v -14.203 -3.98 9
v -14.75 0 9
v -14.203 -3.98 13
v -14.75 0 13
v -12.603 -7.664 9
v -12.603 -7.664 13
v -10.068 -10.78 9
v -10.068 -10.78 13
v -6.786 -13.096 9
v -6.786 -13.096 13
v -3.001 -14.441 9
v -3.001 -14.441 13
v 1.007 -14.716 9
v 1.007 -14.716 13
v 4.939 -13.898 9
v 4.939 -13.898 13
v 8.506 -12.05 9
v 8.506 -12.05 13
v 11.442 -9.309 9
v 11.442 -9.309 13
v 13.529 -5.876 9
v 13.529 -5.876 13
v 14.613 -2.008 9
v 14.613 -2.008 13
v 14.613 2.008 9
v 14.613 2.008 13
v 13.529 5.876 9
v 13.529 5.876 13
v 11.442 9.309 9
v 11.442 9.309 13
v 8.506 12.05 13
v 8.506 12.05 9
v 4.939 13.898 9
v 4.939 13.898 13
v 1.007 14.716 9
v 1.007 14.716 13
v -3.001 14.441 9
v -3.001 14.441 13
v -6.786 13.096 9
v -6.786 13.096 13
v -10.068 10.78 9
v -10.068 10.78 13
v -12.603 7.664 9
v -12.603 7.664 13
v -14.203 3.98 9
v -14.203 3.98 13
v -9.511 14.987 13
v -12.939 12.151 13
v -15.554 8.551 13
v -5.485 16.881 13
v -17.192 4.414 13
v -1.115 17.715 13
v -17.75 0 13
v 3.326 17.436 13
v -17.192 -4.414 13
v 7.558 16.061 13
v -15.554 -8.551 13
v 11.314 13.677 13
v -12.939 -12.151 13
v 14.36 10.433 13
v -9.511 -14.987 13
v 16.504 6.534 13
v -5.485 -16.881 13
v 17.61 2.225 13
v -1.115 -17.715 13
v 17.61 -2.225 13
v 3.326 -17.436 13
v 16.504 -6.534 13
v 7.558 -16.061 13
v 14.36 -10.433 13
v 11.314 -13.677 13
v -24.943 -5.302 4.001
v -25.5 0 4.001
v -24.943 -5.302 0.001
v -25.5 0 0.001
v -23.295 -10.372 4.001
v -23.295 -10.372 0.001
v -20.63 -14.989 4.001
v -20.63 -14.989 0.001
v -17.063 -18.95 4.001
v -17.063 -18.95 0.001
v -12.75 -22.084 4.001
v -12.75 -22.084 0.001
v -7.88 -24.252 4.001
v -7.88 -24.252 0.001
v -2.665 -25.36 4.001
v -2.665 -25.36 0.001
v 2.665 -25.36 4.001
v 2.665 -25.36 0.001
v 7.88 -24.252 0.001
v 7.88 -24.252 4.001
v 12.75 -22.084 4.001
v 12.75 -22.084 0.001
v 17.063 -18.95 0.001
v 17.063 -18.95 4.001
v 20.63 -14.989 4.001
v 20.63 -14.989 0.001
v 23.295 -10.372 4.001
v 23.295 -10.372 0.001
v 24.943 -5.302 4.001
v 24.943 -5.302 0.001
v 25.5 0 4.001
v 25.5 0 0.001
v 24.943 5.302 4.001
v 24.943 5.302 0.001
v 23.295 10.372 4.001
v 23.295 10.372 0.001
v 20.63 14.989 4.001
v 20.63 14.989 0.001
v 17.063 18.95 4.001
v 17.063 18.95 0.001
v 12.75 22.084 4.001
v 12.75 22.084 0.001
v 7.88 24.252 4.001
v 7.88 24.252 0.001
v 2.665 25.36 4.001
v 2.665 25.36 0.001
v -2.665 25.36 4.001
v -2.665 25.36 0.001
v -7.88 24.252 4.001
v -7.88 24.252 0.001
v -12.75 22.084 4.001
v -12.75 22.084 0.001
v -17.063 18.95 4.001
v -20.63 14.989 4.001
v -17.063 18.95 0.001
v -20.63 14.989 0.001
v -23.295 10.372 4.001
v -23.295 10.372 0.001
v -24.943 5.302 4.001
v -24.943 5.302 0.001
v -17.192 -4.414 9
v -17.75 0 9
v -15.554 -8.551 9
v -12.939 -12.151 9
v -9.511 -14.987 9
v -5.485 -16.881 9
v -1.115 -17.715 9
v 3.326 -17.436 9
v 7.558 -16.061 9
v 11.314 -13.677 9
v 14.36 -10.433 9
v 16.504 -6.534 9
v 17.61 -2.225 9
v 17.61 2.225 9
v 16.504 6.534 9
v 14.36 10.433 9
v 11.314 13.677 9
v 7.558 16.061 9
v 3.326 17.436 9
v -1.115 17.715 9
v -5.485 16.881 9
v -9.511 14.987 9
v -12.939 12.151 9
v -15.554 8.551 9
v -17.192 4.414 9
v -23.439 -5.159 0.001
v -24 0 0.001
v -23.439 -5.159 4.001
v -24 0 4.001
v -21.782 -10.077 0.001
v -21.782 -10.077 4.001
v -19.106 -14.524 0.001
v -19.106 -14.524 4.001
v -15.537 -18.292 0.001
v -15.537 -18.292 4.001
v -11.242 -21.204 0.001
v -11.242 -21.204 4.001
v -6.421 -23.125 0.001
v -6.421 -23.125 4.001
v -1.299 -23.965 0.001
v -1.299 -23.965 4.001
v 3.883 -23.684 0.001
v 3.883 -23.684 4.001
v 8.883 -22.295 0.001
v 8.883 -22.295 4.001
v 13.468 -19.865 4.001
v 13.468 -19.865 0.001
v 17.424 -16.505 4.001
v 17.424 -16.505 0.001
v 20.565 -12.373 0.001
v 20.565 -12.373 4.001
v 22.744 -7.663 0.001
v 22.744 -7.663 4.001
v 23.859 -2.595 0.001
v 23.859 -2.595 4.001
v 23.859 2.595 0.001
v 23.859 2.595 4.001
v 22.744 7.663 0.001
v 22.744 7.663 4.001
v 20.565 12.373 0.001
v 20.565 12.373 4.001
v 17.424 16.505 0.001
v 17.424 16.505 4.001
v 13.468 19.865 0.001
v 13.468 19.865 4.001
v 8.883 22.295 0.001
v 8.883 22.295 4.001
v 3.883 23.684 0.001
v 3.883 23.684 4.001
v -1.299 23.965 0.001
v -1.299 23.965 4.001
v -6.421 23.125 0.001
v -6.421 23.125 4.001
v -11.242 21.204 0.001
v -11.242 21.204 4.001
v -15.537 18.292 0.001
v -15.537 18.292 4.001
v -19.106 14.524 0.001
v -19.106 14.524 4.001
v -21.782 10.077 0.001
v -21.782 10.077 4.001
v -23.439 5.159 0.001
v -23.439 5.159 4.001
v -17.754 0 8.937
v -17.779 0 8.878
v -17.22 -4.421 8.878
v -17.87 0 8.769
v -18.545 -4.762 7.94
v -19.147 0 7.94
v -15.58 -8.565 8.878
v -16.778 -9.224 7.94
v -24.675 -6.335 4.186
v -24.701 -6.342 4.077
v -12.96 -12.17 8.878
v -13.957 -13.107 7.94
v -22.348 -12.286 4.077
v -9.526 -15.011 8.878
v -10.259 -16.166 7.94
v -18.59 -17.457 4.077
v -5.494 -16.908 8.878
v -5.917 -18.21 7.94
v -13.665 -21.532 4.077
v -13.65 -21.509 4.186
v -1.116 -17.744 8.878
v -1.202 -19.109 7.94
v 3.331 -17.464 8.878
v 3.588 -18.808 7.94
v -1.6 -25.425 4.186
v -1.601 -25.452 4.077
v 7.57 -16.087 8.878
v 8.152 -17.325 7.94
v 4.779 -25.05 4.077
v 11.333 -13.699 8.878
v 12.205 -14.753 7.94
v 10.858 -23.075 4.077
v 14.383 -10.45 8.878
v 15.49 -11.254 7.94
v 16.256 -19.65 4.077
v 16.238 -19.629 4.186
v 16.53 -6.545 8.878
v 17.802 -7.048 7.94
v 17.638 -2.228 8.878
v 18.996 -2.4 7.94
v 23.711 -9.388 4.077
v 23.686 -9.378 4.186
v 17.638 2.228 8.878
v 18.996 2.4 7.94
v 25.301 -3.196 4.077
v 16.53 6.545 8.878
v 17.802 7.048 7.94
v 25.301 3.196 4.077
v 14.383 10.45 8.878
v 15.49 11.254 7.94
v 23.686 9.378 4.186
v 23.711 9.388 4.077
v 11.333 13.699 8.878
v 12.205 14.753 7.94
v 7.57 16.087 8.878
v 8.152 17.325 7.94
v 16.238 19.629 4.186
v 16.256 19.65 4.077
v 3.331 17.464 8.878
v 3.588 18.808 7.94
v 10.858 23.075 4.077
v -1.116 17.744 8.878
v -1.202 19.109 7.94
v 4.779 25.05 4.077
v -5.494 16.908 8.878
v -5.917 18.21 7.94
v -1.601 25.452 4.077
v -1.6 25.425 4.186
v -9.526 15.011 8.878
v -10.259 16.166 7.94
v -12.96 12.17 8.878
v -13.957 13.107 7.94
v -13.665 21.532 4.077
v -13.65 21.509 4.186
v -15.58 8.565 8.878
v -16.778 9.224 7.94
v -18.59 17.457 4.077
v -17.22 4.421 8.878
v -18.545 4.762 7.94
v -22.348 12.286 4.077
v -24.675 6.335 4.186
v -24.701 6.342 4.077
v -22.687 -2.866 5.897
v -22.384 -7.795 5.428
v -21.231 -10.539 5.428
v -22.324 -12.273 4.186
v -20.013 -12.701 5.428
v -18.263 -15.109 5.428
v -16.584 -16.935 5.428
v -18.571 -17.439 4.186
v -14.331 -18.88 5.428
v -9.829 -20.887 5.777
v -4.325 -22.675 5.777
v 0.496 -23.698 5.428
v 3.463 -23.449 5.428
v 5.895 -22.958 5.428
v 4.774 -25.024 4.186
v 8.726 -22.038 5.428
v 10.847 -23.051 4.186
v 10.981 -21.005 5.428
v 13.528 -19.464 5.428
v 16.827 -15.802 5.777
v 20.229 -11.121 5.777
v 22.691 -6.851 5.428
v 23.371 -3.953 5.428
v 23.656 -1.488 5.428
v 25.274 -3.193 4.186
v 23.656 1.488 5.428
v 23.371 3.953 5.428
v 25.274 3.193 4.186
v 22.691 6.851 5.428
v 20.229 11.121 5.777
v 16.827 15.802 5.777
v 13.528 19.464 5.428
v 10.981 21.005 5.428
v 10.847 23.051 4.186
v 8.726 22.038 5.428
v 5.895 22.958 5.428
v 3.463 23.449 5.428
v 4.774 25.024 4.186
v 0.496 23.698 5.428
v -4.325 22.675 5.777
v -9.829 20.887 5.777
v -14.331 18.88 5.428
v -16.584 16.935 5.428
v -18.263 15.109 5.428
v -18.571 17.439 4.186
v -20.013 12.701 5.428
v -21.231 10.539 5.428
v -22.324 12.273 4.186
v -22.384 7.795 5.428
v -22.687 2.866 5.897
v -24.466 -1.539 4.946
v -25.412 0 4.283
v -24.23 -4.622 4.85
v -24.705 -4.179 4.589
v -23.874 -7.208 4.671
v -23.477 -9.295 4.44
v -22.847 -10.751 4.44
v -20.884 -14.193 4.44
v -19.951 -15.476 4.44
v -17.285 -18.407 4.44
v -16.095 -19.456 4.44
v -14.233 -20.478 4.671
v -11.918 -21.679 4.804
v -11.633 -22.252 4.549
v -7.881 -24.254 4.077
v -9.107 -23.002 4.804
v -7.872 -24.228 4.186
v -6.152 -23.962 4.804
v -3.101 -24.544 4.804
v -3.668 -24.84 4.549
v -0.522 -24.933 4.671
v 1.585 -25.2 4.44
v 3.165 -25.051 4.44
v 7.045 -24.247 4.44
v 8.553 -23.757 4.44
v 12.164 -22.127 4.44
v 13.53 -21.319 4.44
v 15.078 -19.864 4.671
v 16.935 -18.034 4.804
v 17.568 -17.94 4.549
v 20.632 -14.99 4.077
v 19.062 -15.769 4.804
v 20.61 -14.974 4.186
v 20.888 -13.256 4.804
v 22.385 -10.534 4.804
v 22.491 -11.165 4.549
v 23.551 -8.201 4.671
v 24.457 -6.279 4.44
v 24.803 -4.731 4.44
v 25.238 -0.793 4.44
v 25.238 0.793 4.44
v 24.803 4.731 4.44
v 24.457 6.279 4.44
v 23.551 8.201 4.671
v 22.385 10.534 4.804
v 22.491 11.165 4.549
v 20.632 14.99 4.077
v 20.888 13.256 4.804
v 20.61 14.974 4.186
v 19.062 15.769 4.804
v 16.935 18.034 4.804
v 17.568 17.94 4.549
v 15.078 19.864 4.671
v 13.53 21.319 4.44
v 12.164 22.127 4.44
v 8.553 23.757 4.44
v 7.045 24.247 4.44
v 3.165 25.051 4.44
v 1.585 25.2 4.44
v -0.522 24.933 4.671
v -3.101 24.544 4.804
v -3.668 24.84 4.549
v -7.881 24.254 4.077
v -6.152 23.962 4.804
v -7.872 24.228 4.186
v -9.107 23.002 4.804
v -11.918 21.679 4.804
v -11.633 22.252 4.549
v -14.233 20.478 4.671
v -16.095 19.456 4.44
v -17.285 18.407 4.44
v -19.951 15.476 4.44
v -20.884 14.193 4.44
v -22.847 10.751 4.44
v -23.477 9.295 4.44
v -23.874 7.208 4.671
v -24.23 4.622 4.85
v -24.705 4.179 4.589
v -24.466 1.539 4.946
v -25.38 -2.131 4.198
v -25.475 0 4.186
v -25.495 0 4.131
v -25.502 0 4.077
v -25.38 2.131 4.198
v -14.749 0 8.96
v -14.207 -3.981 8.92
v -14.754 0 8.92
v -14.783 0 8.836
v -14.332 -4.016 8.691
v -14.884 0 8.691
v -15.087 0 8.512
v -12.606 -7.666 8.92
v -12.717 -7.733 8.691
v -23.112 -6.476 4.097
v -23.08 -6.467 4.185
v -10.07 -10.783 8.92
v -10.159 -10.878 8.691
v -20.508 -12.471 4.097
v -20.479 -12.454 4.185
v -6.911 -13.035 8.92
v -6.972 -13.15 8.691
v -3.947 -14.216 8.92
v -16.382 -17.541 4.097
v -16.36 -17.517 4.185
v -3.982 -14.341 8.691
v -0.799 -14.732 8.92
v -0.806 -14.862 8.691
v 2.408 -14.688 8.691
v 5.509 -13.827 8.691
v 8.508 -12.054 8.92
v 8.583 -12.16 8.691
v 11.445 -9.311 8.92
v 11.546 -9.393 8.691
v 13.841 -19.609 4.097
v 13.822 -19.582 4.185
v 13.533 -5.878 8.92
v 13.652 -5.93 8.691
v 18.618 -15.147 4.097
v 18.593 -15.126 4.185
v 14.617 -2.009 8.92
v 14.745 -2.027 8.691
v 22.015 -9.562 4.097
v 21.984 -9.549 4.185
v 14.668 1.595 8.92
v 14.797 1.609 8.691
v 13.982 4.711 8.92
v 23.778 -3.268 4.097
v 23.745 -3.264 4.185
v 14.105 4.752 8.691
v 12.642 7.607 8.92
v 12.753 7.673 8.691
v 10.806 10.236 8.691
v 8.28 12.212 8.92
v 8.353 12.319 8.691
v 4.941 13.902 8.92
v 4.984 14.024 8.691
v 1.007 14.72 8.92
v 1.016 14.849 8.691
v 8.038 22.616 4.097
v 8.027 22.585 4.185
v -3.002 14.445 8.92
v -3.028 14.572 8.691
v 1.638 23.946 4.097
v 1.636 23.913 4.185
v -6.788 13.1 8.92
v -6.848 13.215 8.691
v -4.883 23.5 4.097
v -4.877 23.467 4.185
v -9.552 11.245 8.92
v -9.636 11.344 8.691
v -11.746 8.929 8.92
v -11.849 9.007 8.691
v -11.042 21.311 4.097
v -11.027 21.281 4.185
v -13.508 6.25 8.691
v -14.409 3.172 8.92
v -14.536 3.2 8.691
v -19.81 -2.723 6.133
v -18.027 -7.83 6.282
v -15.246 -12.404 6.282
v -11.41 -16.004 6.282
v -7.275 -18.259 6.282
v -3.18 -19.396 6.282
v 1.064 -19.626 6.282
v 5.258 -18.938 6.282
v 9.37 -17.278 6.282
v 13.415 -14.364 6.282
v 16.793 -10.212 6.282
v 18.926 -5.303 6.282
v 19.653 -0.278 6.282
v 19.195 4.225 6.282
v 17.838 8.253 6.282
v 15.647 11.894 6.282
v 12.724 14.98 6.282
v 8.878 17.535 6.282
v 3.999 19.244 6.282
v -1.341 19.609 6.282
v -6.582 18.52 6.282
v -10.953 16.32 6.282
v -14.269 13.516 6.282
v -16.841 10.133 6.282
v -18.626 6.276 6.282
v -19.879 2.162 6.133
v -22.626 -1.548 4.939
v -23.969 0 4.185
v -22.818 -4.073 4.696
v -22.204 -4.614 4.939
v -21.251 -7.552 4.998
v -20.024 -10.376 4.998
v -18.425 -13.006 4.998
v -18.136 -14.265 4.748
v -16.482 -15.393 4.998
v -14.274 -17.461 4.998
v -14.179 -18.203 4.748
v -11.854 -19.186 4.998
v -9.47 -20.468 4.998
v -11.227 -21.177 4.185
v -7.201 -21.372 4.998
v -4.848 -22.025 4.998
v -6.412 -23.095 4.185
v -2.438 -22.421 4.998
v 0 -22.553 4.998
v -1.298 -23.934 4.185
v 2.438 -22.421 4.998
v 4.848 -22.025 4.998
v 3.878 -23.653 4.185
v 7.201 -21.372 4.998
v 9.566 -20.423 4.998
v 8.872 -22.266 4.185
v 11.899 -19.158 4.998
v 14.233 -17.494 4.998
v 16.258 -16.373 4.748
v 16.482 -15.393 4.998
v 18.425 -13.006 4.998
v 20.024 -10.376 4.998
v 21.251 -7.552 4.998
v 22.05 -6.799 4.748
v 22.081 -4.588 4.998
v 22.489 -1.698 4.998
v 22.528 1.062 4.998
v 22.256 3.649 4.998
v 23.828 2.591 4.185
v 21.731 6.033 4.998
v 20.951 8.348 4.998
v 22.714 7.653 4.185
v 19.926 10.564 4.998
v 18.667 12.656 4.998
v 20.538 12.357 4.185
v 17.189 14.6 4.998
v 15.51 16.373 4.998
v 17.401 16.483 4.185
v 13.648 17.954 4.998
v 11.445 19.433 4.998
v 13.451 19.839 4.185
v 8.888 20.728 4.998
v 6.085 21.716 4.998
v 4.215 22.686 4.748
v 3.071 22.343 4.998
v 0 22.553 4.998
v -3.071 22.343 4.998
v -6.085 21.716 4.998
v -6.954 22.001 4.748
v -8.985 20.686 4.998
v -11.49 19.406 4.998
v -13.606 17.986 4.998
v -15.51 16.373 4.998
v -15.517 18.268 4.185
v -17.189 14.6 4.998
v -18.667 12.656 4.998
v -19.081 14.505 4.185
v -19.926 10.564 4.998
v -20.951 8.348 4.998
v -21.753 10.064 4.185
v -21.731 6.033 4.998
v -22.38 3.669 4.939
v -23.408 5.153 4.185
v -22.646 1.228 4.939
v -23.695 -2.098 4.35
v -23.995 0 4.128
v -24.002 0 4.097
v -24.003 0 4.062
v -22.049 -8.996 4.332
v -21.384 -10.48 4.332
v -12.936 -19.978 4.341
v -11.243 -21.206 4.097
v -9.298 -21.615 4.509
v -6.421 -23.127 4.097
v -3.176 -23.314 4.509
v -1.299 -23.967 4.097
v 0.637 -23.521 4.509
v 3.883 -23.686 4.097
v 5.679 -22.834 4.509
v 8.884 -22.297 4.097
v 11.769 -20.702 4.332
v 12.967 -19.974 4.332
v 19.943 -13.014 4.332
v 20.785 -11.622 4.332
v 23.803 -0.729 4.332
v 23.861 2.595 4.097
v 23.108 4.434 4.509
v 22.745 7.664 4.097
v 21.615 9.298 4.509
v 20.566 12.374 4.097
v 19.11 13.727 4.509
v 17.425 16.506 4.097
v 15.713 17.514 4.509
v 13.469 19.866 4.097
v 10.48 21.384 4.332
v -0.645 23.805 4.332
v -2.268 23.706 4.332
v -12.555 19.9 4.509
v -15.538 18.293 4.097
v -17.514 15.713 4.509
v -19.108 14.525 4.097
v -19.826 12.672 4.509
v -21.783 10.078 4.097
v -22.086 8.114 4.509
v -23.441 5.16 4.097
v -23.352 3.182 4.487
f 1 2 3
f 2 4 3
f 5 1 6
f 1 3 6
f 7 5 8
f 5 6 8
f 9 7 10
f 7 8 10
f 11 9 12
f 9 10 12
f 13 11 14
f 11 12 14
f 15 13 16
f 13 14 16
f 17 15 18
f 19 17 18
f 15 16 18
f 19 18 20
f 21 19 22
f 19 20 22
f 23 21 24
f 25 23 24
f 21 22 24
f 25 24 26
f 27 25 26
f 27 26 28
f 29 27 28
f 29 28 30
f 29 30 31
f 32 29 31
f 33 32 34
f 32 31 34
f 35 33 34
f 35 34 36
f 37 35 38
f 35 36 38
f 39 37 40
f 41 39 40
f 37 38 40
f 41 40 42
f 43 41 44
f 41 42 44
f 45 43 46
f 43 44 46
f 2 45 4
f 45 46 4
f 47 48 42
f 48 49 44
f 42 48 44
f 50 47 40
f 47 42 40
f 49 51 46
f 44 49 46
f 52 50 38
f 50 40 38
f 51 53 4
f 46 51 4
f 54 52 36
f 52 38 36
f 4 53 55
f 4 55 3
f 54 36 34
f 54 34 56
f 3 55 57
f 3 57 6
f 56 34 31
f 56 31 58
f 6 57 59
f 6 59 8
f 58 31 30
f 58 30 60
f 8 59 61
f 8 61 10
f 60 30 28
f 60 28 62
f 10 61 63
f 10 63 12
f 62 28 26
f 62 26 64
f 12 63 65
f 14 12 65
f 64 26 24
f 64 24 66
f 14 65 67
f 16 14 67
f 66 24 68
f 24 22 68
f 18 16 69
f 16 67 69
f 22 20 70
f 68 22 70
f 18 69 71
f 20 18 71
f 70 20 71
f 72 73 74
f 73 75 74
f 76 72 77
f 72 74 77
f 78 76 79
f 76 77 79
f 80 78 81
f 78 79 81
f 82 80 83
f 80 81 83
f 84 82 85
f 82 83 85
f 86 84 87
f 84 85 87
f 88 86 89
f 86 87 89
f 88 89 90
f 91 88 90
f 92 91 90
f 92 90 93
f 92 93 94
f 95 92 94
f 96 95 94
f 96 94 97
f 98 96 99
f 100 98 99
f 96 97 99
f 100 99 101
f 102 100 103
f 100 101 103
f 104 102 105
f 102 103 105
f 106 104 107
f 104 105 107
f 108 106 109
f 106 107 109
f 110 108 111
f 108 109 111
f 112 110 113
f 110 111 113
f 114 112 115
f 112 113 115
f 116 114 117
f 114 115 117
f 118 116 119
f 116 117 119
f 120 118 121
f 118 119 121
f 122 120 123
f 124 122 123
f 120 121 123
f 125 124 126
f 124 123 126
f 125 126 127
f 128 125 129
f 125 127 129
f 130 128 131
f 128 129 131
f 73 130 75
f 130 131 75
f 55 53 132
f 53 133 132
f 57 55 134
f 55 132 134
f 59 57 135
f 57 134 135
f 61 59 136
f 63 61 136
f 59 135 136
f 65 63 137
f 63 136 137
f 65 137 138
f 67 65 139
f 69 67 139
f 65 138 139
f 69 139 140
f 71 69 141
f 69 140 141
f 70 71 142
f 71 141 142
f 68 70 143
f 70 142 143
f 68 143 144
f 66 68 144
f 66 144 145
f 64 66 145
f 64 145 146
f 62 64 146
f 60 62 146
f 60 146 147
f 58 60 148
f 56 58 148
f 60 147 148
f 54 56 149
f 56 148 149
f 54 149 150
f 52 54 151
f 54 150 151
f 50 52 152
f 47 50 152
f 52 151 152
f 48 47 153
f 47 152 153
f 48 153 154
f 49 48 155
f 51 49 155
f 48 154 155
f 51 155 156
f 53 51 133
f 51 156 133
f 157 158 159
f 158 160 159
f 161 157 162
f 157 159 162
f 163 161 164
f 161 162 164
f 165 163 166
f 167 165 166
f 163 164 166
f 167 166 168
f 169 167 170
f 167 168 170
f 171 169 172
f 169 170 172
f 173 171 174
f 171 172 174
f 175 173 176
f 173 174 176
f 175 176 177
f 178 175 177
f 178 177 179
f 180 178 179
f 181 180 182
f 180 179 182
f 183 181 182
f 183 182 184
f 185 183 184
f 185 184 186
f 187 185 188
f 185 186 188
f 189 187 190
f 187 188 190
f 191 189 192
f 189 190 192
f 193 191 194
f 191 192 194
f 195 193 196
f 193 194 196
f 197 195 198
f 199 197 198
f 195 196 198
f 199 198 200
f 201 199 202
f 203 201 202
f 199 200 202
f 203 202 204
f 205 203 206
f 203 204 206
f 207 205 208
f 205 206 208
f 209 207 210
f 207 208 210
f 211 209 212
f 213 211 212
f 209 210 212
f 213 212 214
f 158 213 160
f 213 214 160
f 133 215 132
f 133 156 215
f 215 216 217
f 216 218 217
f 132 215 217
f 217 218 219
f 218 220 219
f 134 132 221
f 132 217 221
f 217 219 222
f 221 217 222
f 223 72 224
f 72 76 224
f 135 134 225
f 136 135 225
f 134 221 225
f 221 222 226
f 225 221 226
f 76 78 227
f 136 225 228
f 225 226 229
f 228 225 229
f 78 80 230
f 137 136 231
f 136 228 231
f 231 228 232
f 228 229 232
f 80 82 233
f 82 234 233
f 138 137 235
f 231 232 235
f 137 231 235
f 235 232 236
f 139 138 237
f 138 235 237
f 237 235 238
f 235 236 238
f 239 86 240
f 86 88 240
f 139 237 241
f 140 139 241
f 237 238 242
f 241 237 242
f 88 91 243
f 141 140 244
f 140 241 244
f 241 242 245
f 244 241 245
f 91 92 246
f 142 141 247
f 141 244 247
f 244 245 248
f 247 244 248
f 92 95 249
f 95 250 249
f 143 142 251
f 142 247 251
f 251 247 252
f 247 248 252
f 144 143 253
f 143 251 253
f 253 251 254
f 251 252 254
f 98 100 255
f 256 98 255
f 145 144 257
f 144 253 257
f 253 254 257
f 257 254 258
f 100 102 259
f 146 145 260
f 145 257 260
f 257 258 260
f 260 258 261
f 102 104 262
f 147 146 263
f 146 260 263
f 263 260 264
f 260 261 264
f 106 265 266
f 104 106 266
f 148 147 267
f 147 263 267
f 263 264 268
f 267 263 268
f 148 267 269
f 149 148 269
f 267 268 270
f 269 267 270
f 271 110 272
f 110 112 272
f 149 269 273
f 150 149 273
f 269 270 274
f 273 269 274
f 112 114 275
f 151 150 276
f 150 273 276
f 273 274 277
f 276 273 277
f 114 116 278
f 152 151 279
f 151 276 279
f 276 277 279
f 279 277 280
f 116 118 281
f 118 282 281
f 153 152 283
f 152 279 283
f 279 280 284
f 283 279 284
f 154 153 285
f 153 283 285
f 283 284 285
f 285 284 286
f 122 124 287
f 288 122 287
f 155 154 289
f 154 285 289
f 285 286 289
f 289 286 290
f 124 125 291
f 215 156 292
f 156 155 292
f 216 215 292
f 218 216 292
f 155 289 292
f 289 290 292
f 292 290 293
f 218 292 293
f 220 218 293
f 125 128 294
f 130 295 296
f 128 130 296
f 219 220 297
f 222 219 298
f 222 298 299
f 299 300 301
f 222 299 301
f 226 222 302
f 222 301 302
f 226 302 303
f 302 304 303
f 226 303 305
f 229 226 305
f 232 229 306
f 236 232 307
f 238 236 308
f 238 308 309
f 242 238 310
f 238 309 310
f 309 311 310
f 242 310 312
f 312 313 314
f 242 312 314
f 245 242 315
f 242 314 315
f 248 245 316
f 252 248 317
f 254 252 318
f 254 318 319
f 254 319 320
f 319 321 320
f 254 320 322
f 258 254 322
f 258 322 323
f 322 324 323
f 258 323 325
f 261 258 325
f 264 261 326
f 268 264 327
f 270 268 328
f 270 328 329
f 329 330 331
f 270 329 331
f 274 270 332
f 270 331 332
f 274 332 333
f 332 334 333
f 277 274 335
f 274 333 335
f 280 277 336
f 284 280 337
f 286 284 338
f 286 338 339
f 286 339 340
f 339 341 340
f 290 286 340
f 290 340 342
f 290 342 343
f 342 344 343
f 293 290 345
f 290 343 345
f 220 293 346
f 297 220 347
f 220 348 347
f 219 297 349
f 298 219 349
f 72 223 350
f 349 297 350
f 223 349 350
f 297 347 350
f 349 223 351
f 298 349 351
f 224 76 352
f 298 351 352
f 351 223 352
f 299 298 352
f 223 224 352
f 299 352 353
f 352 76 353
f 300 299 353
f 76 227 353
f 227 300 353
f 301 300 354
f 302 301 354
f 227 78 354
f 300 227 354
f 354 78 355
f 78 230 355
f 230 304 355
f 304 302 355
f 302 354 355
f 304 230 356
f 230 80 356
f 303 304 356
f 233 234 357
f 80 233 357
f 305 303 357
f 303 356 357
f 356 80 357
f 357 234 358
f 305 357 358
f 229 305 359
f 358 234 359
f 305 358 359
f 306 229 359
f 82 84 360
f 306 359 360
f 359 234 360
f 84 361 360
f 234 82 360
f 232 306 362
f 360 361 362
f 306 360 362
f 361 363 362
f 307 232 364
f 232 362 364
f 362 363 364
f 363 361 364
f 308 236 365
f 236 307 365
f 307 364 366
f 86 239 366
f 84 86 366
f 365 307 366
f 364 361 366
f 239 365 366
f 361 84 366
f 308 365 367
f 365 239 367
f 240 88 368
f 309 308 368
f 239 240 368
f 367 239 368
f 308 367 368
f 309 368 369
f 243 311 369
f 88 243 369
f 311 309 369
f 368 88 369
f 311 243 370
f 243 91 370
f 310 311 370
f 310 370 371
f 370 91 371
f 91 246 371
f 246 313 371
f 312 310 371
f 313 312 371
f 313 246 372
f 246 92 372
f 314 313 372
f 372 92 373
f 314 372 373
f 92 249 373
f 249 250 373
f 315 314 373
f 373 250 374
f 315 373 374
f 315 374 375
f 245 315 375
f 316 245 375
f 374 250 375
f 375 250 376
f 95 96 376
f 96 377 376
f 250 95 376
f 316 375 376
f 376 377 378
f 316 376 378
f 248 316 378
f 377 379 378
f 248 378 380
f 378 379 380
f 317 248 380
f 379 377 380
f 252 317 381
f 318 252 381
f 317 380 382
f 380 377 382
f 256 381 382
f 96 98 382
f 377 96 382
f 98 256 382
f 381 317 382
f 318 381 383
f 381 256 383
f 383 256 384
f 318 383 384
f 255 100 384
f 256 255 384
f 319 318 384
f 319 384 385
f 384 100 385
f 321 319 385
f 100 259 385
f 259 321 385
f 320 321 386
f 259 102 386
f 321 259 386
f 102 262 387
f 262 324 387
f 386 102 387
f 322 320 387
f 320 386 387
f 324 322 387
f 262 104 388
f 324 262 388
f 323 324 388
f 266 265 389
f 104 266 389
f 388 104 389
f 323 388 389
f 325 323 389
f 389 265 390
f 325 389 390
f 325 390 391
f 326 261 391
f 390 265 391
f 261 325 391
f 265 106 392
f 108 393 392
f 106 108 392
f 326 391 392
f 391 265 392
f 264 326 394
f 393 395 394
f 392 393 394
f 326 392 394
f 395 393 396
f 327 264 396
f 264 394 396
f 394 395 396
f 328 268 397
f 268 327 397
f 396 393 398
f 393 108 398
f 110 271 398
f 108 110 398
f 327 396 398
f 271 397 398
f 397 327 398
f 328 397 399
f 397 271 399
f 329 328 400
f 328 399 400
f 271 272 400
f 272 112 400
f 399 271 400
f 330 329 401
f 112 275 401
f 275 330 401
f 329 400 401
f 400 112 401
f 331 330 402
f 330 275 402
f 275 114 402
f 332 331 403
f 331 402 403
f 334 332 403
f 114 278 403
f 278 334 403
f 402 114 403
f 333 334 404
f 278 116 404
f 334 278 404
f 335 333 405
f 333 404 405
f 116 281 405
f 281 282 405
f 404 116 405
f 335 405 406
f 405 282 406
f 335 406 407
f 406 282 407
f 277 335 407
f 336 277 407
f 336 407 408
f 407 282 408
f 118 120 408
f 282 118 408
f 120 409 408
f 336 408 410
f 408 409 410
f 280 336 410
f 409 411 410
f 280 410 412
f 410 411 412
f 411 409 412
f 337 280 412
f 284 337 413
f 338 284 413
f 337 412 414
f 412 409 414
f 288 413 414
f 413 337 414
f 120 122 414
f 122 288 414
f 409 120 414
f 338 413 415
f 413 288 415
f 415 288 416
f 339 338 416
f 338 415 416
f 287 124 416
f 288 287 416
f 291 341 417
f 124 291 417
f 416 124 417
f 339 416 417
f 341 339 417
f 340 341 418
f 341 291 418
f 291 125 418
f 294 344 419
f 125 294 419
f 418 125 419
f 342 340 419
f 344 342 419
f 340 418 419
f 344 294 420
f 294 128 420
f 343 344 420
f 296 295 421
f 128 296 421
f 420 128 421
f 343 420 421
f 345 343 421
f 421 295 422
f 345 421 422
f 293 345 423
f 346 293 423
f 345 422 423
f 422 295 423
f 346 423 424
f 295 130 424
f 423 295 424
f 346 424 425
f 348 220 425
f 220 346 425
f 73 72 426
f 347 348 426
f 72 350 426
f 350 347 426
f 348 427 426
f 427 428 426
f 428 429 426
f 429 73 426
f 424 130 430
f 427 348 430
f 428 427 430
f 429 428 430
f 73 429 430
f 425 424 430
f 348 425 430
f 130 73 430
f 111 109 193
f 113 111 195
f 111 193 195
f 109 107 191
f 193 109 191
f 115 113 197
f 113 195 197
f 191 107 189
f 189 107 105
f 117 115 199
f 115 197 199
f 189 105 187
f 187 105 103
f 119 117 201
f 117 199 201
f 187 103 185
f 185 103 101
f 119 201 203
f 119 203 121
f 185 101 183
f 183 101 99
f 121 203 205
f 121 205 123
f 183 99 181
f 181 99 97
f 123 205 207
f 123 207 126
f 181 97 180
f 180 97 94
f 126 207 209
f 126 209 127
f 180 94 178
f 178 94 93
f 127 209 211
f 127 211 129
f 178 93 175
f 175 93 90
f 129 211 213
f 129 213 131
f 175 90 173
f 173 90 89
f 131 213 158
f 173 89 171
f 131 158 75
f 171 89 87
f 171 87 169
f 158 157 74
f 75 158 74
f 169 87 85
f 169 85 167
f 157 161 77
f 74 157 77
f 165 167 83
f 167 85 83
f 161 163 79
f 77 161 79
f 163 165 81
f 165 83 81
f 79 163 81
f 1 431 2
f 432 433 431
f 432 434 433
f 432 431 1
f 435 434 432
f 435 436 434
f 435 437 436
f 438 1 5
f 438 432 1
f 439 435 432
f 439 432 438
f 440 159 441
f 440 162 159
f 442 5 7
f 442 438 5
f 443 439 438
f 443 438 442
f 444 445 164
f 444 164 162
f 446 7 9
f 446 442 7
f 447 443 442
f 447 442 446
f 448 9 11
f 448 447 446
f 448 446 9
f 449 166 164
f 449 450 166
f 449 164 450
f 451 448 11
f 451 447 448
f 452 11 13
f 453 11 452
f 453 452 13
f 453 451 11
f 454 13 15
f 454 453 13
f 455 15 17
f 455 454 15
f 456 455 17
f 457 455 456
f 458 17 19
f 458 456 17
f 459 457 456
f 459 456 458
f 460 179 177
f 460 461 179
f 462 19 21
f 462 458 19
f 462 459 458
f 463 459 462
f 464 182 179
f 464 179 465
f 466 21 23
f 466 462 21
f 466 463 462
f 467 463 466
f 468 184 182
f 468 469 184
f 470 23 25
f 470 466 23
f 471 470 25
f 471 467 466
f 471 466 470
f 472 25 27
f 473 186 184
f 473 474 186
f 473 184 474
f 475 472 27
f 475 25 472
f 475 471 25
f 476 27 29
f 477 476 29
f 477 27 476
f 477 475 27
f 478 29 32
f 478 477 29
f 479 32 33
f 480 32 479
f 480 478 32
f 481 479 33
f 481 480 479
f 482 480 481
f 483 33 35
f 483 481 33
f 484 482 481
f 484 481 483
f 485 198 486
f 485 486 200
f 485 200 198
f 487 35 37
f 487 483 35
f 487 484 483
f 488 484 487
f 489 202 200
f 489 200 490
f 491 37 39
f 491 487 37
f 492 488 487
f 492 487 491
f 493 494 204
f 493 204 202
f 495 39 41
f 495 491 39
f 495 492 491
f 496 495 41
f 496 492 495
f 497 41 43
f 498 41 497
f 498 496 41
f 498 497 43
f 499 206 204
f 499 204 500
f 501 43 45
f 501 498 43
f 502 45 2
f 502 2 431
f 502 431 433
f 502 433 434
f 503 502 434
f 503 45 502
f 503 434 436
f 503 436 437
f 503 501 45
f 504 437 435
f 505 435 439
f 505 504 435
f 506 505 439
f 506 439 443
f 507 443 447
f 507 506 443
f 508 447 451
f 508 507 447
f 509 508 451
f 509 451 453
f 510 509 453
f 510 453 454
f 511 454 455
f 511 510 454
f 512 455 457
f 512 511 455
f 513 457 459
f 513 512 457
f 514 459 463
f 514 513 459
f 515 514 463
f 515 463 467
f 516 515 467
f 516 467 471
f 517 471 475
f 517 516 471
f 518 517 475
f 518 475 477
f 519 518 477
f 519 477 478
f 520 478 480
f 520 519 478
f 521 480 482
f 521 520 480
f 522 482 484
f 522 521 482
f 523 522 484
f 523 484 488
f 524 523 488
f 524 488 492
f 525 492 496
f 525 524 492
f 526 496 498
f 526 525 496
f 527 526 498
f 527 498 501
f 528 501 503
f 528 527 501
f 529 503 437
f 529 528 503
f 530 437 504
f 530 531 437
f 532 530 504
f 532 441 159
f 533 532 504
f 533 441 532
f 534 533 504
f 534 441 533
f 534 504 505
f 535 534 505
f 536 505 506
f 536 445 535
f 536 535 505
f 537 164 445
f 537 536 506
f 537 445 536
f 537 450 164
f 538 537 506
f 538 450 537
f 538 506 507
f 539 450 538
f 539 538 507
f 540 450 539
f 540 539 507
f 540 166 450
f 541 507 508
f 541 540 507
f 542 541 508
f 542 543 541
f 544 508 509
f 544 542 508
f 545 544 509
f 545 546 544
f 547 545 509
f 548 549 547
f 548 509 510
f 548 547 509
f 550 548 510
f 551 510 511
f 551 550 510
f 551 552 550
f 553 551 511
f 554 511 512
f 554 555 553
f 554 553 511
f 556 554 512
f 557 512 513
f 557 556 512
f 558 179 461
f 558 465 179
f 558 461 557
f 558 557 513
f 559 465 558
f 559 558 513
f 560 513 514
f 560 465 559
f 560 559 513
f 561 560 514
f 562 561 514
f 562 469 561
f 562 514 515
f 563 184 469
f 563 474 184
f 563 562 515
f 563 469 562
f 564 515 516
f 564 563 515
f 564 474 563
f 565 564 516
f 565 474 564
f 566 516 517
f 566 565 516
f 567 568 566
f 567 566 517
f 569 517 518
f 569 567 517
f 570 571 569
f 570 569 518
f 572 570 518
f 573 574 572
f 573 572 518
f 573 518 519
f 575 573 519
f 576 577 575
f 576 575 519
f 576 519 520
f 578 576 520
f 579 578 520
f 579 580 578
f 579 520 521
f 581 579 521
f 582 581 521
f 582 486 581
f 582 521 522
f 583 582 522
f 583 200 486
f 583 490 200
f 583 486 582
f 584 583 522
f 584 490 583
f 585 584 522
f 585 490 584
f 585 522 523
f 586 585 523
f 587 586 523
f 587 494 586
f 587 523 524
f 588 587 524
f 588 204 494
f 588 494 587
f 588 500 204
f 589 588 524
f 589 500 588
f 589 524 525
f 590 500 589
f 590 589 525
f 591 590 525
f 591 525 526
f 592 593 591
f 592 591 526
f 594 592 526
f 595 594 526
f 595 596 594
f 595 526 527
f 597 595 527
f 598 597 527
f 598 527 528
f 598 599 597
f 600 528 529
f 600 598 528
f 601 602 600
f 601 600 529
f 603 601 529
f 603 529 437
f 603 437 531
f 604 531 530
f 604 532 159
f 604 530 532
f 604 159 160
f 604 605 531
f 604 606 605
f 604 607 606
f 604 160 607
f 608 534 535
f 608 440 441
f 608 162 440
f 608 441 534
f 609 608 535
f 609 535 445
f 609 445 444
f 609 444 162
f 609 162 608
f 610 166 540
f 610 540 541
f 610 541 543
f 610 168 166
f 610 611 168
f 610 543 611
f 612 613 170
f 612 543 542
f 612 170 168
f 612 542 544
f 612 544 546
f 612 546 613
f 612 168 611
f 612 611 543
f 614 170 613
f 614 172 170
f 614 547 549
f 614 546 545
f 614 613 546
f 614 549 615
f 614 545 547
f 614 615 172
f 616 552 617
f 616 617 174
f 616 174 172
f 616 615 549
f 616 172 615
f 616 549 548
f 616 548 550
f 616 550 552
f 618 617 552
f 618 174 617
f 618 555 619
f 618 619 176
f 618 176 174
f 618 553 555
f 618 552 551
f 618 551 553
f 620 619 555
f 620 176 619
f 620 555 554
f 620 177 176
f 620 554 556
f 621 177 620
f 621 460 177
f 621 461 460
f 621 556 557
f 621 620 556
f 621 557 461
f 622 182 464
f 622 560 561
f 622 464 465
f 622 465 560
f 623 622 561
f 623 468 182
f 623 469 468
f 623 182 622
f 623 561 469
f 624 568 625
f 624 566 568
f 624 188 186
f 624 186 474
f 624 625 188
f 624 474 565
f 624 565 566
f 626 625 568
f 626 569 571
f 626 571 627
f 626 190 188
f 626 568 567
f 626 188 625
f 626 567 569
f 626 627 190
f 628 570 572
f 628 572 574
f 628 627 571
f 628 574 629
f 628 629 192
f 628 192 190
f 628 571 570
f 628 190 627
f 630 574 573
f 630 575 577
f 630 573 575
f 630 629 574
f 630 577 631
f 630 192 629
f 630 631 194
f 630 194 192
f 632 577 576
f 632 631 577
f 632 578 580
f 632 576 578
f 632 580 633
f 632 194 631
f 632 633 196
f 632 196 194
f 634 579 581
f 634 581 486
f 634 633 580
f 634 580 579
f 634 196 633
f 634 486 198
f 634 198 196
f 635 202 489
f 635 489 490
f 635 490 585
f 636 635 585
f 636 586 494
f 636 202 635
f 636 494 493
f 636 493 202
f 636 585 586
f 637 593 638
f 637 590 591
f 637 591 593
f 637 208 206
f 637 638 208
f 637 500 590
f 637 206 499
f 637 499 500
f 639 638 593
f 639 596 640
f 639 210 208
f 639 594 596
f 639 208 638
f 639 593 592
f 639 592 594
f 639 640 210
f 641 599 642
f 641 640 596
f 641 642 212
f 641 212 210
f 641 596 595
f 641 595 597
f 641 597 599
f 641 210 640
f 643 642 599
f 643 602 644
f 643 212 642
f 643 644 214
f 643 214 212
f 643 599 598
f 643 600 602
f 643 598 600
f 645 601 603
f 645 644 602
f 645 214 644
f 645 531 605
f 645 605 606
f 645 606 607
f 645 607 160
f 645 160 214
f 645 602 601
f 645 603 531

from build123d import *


with BuildPart() as f1:
    # F0 (on Front) → F1 (revolve)
    with BuildSketch(Plane.XZ):
        with BuildLine():
            Line((-25.5, 4.000665223), (-25.5, 0.000665223))
            Line((-25.5, 0.000665223), (-24, 0.000665223))
            Line((-24, 0.000665223), (-24, 4.000665223))
            add(Edge.make_bspline(
                [(-14.75, 9.0000554125), (-14.7498478162, 8.9790042563), (-14.5819417468, 8.1571602932), (-24.2245944145, 4.5685211878), (-24, 4.0775702806), (-24, 4.000665223)],
                knots=[0, 0, 0, 0, 0.1472349086, 0.8728652968, 1, 1, 1, 1], degree=3))
            Line((-14.75, 9.0000554125), (-14.75, 13.0000554125))
            Line((-14.75, 13.0000554125), (-17.75, 13.0000554125))
            Line((-17.75, 13.0000554125), (-17.75, 9.0000554125))
            add(Edge.make_bspline(
                [(-17.75, 9.0000554125), (-17.7506663859, 8.9728591273), (-17.6144972198, 8.5106069443), (-25.7362839034, 4.6182240272), (-25.4969472736, 4.0633681762), (-25.5, 4.000665223)],
                knots=[0, 0, 0, 0, 0.1214853131, 0.852851879, 1, 1, 1, 1], degree=3))
        make_face()
    revolve(axis=Axis((0, 0, 6.5), (0, 0, 1)))


solid = f1.part
